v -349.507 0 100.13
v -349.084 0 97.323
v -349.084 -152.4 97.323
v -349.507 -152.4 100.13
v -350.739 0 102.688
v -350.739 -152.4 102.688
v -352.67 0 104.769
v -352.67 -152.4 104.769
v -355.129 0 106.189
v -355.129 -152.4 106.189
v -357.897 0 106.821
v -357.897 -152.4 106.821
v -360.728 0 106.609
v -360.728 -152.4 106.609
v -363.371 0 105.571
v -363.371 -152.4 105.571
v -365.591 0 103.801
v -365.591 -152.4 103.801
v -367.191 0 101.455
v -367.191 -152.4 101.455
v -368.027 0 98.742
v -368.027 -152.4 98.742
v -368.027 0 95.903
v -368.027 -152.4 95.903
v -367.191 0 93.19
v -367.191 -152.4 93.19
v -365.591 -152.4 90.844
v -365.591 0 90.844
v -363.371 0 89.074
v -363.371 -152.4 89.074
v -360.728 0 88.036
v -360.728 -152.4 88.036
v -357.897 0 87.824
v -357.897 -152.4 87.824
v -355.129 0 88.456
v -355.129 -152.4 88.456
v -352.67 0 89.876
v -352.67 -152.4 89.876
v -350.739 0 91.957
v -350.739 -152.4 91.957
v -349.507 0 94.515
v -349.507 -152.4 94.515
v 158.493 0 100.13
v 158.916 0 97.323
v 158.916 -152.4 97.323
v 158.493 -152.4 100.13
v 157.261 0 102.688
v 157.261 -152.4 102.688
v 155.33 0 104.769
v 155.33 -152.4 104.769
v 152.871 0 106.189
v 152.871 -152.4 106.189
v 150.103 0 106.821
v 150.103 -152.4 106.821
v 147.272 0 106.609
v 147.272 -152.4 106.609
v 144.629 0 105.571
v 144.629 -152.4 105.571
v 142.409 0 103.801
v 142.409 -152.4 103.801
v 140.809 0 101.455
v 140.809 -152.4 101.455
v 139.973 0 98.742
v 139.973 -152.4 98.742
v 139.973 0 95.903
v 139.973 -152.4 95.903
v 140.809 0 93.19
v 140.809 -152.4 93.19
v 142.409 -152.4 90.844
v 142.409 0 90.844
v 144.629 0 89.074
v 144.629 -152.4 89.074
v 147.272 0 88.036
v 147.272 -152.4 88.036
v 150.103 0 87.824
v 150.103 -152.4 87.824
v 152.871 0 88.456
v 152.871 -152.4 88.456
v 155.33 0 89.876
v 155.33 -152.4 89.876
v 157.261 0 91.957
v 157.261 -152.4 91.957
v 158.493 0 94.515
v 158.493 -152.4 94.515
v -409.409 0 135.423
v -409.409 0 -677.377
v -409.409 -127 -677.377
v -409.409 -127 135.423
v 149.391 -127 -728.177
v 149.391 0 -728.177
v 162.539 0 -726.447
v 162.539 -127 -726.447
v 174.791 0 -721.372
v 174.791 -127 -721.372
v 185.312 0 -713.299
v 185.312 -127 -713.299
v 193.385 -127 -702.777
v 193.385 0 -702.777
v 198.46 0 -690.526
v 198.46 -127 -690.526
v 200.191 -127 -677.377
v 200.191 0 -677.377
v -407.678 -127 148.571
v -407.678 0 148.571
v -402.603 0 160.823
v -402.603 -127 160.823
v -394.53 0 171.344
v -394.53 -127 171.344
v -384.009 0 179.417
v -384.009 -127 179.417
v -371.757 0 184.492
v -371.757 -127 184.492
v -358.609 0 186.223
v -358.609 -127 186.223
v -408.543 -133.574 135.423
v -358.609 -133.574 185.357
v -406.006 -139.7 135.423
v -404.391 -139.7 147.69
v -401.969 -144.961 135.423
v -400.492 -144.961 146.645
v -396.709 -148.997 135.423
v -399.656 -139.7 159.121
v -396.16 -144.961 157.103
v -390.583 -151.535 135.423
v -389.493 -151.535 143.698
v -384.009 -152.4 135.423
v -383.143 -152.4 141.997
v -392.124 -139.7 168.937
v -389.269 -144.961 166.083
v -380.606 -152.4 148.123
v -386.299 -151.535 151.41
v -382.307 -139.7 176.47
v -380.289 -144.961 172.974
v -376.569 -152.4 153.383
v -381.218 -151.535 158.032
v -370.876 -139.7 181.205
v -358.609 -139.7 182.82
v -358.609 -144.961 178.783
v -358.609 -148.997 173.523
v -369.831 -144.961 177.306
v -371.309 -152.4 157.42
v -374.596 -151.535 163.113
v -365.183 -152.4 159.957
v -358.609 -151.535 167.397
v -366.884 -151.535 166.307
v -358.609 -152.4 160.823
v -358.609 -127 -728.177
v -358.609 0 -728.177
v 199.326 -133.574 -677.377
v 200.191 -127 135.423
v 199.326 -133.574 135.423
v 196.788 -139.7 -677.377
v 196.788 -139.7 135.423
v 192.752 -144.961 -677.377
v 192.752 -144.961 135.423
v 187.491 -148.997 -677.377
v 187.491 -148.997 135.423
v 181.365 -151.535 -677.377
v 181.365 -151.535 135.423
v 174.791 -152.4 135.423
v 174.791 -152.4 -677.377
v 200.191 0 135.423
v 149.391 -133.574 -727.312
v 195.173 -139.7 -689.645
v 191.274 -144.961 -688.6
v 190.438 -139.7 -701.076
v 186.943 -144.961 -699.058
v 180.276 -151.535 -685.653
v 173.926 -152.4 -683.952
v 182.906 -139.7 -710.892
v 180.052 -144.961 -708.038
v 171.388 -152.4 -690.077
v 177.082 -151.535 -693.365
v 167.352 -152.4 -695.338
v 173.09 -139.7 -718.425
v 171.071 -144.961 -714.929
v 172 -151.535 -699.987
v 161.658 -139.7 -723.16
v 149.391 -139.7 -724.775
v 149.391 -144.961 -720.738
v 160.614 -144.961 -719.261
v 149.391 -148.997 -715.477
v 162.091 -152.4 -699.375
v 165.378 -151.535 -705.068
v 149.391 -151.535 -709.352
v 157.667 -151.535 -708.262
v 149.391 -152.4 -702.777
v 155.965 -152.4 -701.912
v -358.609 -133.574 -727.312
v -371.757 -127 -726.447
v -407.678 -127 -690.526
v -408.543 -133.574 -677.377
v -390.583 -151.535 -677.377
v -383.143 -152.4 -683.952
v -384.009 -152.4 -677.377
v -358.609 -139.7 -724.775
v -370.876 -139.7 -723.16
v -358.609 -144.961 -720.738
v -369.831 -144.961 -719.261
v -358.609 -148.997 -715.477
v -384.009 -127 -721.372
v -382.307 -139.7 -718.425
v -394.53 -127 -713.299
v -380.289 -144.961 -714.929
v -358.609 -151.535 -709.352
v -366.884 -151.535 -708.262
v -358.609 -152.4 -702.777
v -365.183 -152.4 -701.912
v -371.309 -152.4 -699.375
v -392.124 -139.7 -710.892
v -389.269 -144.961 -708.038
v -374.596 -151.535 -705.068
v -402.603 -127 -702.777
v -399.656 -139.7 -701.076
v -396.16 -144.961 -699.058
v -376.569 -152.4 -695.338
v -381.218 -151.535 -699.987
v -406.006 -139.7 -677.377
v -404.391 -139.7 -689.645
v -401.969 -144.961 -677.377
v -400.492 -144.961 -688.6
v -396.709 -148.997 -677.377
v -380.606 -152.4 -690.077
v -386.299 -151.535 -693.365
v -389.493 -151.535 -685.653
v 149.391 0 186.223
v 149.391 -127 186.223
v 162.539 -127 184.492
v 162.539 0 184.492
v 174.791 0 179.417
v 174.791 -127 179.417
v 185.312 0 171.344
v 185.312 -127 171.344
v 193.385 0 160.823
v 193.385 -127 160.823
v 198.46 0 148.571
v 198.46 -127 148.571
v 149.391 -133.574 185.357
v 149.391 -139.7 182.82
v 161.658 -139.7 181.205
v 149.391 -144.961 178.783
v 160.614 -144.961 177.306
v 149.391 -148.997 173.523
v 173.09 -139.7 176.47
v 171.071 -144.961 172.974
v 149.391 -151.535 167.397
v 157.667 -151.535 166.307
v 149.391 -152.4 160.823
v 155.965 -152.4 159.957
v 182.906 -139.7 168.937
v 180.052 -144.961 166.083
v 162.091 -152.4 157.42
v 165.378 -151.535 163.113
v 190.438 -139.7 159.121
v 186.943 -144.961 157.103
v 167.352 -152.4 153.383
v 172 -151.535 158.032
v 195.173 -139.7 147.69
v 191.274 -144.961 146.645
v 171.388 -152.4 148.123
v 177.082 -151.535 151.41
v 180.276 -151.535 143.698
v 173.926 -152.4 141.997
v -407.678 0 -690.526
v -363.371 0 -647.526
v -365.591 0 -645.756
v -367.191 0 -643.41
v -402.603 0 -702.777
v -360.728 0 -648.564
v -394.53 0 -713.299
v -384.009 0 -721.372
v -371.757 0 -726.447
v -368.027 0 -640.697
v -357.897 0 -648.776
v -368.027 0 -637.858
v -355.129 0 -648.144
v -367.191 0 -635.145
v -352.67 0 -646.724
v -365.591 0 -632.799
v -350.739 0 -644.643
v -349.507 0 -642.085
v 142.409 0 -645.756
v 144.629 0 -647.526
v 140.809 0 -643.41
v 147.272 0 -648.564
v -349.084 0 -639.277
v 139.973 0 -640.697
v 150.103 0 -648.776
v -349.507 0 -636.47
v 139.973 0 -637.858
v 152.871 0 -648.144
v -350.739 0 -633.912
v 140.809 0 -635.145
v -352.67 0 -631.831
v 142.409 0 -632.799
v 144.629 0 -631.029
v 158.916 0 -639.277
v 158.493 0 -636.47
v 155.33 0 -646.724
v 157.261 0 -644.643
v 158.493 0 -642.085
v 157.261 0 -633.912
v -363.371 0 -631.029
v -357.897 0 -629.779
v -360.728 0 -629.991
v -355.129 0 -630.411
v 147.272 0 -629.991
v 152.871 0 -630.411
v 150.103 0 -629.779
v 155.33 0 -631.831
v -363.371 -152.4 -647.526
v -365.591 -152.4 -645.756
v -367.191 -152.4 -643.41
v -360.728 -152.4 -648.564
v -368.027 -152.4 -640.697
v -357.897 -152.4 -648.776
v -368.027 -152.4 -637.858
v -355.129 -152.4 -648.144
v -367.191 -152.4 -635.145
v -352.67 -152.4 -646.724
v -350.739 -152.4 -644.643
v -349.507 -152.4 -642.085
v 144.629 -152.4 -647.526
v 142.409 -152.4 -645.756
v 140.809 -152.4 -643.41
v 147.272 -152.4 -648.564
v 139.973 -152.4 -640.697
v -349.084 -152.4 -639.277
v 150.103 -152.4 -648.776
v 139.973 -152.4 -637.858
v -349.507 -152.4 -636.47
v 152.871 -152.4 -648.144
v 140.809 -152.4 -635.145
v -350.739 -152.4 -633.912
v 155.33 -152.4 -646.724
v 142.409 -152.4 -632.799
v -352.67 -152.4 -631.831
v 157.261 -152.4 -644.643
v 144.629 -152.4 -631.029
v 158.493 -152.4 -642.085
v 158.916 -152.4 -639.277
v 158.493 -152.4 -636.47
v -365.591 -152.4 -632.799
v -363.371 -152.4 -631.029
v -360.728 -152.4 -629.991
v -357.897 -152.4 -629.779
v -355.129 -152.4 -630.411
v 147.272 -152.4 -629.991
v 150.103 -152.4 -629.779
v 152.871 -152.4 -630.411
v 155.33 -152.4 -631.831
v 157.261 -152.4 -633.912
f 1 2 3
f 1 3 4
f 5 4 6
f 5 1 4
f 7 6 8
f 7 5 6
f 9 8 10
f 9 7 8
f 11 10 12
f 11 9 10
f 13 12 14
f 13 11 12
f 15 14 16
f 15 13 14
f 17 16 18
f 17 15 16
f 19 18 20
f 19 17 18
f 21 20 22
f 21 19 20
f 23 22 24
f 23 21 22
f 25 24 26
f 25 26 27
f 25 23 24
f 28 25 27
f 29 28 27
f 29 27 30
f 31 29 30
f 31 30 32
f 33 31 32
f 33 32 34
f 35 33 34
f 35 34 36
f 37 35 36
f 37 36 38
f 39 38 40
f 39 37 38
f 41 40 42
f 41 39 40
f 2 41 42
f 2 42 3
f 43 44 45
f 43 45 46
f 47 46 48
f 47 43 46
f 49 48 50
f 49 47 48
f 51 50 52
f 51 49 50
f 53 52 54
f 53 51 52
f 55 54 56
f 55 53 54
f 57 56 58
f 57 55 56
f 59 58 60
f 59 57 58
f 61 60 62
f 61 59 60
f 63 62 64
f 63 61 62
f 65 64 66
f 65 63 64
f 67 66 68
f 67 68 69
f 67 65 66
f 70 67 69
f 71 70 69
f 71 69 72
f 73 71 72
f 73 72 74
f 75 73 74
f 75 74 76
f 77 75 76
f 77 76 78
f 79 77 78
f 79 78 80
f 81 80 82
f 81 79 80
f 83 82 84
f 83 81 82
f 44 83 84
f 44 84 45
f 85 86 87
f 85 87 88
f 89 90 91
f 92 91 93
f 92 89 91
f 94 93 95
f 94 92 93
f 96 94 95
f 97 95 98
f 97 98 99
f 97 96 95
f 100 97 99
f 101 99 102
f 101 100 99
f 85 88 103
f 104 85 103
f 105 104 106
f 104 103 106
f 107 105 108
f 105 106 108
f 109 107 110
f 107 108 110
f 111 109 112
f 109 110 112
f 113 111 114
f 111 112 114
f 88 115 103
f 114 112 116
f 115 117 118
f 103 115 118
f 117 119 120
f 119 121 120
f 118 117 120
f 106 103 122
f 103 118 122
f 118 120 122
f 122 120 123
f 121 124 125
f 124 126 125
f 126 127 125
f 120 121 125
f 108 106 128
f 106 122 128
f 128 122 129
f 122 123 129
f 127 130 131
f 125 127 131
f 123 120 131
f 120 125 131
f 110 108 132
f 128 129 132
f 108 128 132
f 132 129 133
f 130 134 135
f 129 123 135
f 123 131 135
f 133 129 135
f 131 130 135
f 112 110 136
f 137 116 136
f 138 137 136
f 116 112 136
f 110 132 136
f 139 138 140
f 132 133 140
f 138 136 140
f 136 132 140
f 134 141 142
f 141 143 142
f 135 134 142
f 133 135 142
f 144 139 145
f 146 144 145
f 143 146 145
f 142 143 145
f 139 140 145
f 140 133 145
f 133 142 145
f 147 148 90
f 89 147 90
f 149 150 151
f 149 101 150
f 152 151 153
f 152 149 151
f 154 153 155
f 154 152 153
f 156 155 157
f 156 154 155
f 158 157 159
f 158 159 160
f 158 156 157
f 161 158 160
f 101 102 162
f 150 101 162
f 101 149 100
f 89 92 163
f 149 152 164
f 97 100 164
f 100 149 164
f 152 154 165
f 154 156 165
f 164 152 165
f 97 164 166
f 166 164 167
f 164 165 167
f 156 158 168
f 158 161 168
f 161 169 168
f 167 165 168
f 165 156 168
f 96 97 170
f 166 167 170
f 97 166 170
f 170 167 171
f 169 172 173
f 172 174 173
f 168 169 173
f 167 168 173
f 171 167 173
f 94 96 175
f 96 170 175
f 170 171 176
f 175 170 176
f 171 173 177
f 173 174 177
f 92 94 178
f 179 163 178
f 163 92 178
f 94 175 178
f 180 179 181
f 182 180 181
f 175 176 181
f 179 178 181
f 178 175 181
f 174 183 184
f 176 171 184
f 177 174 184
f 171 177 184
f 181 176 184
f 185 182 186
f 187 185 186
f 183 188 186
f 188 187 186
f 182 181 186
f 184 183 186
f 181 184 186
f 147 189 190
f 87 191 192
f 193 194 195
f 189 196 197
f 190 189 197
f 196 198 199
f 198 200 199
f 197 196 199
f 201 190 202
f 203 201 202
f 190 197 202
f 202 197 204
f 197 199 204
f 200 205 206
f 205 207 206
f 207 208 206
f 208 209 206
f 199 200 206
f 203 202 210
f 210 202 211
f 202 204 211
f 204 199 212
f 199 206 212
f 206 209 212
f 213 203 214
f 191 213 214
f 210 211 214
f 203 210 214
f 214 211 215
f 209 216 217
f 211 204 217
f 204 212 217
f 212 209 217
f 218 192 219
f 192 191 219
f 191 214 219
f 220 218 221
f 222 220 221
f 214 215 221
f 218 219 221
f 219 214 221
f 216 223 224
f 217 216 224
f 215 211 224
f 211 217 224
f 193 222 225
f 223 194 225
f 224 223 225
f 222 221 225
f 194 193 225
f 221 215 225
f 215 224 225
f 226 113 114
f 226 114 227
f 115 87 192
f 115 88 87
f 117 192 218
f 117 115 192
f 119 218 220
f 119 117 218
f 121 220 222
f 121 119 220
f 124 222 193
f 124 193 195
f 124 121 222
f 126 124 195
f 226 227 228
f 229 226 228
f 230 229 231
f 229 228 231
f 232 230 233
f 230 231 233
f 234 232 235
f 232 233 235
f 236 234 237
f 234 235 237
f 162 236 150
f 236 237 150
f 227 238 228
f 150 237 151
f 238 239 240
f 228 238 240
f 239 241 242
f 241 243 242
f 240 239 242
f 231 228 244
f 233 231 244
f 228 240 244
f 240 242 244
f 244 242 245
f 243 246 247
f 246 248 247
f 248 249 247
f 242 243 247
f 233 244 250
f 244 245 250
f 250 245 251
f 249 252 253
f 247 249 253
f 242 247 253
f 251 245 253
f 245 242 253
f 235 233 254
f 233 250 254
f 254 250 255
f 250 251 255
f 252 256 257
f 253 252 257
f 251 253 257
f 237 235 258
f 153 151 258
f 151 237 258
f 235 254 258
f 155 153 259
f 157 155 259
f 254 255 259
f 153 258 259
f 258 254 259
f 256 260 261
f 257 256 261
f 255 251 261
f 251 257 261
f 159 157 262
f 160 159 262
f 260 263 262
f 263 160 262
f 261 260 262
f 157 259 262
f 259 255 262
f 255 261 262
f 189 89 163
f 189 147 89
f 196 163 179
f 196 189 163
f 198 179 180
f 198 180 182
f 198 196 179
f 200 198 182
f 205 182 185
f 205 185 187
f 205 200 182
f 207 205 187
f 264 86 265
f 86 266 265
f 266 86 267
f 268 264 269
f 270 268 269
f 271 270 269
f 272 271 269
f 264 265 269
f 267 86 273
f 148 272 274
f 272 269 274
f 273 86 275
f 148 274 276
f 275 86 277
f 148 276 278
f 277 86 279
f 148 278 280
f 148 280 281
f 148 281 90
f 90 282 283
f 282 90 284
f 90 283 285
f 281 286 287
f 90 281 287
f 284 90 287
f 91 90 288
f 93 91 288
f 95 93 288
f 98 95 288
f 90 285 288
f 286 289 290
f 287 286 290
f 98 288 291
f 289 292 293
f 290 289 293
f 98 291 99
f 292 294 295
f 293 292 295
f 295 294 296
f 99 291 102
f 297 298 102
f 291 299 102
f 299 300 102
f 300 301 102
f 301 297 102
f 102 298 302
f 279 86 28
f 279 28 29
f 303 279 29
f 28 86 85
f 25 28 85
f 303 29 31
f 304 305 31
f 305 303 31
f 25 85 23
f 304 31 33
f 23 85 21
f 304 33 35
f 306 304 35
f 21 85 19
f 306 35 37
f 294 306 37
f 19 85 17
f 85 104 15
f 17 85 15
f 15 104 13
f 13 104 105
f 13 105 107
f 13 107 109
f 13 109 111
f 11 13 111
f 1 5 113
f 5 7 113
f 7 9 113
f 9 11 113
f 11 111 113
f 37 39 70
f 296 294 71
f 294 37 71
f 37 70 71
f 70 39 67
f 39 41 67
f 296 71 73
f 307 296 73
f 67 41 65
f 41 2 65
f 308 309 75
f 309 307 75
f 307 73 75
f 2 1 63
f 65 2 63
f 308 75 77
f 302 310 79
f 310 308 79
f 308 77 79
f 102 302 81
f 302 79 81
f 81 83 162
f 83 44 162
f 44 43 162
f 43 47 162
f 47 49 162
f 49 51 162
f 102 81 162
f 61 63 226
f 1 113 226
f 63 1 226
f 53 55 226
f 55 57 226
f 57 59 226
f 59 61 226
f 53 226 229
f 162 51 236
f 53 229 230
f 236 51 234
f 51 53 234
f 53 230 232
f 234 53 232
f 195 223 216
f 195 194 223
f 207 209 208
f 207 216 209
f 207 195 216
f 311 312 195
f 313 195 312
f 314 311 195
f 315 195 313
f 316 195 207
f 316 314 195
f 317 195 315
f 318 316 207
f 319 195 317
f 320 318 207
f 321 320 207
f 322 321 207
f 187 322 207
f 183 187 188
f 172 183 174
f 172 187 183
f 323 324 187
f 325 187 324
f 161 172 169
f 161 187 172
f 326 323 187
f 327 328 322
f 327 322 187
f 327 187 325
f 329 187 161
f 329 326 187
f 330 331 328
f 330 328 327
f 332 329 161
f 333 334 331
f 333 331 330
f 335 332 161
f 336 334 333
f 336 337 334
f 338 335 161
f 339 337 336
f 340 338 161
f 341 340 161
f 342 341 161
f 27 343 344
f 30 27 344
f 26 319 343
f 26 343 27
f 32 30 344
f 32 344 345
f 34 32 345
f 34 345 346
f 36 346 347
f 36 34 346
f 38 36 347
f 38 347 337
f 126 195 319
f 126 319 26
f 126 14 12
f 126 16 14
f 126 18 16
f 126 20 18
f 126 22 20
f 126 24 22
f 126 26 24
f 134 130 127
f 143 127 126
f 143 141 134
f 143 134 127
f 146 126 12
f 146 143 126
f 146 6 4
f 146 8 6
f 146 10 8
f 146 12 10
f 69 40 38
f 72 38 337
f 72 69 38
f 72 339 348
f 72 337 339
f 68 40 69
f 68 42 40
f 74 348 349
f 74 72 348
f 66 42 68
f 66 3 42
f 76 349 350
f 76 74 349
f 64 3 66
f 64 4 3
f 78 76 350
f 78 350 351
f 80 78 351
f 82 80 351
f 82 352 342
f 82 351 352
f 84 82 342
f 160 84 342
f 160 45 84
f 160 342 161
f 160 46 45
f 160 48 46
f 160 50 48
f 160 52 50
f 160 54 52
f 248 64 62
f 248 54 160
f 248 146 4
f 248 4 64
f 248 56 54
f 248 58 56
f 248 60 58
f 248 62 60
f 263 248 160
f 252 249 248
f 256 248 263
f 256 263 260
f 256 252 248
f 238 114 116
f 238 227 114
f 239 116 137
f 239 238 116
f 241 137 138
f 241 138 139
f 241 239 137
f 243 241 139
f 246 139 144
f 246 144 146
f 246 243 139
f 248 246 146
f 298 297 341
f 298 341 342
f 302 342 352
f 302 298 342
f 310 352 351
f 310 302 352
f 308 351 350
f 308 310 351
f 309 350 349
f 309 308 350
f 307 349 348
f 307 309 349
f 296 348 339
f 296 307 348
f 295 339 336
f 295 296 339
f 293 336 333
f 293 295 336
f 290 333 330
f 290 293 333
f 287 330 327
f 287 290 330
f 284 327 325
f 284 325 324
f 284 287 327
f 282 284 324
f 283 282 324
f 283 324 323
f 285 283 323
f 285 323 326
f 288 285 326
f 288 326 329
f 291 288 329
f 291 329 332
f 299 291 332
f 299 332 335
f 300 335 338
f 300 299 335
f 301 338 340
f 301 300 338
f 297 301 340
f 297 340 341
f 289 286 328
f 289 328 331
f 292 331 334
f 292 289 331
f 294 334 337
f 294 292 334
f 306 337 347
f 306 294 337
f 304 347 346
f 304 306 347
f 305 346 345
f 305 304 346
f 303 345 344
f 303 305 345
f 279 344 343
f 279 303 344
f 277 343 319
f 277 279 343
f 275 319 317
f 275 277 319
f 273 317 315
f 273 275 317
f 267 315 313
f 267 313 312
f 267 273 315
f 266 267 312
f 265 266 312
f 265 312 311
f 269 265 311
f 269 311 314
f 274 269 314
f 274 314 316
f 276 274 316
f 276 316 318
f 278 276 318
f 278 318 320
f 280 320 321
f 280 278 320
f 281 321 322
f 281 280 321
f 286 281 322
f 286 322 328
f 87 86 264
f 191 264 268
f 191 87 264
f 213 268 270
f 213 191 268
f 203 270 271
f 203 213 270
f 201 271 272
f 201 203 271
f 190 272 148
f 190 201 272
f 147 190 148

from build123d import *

# Parameters (mm, degrees)
F0_W     = 609.6
F0_H     = 914.4
F0_R     = 9.525
F1_DEPTH = 152.4
F2_R     = 50.8
F3_R     = 25.4


with BuildPart() as f1:
    # F0 (on Front) → F1 (new body)
    with BuildSketch(Plane.XZ):
        with Locations((-104.6087741801, -270.9774990136)):
            Rectangle(F0_W, F0_H)
        with Locations((-358.6087741801, -639.2774990136)):
            Circle(F0_R, mode=Mode.SUBTRACT)
        with Locations((149.3912258199, -639.2774990136)):
            Circle(F0_R, mode=Mode.SUBTRACT)
        with Locations((-358.6087741801, 97.3225009864)):
            Circle(F0_R, mode=Mode.SUBTRACT)
        with Locations((149.3912258199, 97.3225009864)):
            Circle(F0_R, mode=Mode.SUBTRACT)
    extrude(amount=F1_DEPTH)

    # F2
    f2_edges = [f1.edges().sort_by_distance(p)[0] for p in [
        (200.191226, -76.2, -728.177499),
        (200.191226, -76.2, 186.222501),
        (-409.408774, -76.2, -728.177499),
        (-409.408774, -76.2, 186.222501),
    ]]
    fillet(f2_edges, radius=F2_R)

    # F3
    f3_edges = [f1.edges().sort_by_distance(p)[0] for p in [
        (-409.408774, -152.4, -270.977499),
        (-394.529799, -152.4, -713.298523),
        (-104.608774, -152.4, -728.177499),
        (185.31225, -152.4, -713.298523),
        (200.191226, -152.4, -270.977499),
        (-104.608774, -152.4, 186.222501),
        (185.31225, -152.4, 171.343525),
        (-394.529799, -152.4, 171.343525),
    ]]
    fillet(f3_edges, radius=F3_R)


solid = f1.part
